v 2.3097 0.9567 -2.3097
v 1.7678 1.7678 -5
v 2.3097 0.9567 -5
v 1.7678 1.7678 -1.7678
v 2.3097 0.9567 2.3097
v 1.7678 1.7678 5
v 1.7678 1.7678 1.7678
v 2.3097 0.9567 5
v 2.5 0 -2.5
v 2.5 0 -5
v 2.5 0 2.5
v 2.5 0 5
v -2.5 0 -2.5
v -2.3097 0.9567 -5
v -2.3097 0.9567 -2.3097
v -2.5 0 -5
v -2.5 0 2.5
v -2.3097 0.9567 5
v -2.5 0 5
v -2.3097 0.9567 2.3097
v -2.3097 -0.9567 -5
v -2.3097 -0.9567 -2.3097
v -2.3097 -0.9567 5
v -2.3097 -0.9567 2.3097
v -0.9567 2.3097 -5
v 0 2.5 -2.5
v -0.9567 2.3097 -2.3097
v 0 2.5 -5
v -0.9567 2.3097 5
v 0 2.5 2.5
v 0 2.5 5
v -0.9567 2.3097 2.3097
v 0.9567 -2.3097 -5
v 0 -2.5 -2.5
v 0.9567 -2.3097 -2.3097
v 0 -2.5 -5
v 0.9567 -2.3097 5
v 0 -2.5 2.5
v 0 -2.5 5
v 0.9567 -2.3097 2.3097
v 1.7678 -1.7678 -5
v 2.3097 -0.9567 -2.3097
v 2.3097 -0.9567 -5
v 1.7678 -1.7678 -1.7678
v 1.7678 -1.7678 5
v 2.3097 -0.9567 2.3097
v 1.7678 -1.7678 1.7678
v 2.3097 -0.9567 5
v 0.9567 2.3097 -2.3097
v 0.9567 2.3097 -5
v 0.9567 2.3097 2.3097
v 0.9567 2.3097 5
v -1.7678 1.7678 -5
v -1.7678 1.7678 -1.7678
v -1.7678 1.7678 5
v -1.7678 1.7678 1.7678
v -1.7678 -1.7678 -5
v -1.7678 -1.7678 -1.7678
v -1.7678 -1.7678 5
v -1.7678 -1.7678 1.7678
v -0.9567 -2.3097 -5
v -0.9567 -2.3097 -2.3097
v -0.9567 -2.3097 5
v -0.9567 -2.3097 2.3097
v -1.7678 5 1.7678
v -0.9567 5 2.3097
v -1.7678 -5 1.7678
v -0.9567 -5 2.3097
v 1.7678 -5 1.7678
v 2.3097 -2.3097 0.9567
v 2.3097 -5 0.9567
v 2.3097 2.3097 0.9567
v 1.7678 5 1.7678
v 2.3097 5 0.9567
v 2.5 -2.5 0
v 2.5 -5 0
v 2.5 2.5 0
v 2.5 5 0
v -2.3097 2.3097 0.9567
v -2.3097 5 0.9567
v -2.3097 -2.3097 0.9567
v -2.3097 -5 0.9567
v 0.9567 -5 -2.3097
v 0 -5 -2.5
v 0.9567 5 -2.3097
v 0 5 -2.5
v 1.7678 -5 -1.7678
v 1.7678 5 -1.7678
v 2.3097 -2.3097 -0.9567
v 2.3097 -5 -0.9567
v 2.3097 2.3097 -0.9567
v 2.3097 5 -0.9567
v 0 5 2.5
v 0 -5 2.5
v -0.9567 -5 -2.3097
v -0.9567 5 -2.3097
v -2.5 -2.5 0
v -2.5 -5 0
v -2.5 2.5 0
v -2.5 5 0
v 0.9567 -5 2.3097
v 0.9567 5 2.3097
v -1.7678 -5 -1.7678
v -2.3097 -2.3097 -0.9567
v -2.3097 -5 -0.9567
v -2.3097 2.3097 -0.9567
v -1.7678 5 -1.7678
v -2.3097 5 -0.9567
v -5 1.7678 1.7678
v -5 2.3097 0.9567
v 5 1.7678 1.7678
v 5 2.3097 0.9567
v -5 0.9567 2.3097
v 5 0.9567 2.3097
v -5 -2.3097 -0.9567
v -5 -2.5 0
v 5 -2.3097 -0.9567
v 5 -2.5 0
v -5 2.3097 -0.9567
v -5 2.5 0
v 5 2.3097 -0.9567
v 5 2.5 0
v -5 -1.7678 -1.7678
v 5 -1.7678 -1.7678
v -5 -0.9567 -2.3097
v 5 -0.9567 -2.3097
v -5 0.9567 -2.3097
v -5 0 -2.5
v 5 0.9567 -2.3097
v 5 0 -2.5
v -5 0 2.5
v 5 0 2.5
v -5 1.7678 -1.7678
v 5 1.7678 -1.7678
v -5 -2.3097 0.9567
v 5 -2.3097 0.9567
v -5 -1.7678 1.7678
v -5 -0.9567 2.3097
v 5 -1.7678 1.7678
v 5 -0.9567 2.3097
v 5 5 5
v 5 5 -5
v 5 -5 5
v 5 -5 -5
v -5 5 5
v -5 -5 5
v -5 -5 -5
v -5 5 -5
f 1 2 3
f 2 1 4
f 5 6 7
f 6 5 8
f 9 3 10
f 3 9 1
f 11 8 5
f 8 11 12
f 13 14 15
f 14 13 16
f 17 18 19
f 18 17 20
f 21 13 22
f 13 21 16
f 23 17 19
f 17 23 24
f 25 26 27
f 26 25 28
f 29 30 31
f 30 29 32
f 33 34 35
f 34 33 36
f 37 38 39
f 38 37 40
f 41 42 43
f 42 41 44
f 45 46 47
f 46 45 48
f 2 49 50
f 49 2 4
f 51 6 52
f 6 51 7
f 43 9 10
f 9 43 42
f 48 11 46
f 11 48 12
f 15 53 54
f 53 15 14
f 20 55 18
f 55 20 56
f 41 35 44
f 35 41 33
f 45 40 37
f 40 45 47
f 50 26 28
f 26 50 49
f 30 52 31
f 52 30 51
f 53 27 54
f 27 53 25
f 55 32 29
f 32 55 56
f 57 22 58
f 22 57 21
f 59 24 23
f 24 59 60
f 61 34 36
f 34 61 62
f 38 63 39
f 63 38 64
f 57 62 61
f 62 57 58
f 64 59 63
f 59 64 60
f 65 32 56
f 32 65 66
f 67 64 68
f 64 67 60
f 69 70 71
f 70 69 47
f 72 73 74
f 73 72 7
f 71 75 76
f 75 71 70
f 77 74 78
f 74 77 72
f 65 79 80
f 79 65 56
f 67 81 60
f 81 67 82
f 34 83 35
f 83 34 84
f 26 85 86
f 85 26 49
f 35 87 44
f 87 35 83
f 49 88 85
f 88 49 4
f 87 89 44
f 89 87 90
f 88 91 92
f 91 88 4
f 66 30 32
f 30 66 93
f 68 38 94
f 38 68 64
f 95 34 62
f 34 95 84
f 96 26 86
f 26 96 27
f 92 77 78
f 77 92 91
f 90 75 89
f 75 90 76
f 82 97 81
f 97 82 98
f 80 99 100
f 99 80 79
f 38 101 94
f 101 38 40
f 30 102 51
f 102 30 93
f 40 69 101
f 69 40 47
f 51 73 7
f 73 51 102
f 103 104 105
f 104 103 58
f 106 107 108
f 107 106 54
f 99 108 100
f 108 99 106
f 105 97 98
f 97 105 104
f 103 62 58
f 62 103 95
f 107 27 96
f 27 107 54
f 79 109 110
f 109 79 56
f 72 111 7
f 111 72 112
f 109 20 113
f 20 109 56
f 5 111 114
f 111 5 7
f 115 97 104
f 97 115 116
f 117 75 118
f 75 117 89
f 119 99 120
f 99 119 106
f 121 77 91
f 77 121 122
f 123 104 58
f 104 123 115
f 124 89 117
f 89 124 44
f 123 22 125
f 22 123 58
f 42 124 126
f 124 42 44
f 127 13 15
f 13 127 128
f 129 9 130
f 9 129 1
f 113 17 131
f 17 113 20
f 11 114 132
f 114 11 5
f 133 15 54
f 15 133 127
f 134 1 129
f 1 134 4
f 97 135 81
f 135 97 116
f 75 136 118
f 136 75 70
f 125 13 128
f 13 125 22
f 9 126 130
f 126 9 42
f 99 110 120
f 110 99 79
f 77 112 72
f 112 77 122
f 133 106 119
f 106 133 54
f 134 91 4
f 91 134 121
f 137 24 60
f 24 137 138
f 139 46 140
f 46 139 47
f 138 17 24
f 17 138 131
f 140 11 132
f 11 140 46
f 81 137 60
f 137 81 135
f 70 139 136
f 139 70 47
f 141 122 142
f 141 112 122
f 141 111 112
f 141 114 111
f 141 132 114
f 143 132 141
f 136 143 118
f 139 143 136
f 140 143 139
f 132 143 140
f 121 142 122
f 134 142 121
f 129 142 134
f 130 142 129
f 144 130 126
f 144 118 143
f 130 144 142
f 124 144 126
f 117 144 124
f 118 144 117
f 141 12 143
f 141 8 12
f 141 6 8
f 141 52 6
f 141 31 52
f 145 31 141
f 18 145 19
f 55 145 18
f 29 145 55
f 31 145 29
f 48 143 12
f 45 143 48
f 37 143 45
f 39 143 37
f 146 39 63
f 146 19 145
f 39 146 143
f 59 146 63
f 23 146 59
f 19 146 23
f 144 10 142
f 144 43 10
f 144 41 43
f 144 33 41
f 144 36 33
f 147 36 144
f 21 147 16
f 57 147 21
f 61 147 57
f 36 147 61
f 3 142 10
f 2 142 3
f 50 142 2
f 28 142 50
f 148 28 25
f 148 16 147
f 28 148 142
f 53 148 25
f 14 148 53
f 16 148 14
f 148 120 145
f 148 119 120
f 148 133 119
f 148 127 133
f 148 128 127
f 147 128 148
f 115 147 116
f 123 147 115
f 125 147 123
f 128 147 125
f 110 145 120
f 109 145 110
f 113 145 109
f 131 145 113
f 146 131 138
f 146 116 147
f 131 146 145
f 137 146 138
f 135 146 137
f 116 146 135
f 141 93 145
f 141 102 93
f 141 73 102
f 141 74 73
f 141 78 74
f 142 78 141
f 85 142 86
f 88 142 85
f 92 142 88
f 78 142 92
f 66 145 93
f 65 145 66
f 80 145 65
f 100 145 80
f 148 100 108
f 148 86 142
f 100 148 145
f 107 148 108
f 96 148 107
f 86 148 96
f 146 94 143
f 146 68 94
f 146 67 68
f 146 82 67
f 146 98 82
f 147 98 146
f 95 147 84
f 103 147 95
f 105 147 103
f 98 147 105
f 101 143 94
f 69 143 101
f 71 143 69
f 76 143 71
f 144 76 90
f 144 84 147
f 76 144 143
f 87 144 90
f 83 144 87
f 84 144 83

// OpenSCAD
// three orthogonal holes
difference() {
  cube(10, center = true);
  for (r = [[0, 0, 0], [90, 0, 0], [0, 90, 0]])
    rotate(r) cylinder(h = 12, r = 2.5, center = true, $fn = 16);
}
